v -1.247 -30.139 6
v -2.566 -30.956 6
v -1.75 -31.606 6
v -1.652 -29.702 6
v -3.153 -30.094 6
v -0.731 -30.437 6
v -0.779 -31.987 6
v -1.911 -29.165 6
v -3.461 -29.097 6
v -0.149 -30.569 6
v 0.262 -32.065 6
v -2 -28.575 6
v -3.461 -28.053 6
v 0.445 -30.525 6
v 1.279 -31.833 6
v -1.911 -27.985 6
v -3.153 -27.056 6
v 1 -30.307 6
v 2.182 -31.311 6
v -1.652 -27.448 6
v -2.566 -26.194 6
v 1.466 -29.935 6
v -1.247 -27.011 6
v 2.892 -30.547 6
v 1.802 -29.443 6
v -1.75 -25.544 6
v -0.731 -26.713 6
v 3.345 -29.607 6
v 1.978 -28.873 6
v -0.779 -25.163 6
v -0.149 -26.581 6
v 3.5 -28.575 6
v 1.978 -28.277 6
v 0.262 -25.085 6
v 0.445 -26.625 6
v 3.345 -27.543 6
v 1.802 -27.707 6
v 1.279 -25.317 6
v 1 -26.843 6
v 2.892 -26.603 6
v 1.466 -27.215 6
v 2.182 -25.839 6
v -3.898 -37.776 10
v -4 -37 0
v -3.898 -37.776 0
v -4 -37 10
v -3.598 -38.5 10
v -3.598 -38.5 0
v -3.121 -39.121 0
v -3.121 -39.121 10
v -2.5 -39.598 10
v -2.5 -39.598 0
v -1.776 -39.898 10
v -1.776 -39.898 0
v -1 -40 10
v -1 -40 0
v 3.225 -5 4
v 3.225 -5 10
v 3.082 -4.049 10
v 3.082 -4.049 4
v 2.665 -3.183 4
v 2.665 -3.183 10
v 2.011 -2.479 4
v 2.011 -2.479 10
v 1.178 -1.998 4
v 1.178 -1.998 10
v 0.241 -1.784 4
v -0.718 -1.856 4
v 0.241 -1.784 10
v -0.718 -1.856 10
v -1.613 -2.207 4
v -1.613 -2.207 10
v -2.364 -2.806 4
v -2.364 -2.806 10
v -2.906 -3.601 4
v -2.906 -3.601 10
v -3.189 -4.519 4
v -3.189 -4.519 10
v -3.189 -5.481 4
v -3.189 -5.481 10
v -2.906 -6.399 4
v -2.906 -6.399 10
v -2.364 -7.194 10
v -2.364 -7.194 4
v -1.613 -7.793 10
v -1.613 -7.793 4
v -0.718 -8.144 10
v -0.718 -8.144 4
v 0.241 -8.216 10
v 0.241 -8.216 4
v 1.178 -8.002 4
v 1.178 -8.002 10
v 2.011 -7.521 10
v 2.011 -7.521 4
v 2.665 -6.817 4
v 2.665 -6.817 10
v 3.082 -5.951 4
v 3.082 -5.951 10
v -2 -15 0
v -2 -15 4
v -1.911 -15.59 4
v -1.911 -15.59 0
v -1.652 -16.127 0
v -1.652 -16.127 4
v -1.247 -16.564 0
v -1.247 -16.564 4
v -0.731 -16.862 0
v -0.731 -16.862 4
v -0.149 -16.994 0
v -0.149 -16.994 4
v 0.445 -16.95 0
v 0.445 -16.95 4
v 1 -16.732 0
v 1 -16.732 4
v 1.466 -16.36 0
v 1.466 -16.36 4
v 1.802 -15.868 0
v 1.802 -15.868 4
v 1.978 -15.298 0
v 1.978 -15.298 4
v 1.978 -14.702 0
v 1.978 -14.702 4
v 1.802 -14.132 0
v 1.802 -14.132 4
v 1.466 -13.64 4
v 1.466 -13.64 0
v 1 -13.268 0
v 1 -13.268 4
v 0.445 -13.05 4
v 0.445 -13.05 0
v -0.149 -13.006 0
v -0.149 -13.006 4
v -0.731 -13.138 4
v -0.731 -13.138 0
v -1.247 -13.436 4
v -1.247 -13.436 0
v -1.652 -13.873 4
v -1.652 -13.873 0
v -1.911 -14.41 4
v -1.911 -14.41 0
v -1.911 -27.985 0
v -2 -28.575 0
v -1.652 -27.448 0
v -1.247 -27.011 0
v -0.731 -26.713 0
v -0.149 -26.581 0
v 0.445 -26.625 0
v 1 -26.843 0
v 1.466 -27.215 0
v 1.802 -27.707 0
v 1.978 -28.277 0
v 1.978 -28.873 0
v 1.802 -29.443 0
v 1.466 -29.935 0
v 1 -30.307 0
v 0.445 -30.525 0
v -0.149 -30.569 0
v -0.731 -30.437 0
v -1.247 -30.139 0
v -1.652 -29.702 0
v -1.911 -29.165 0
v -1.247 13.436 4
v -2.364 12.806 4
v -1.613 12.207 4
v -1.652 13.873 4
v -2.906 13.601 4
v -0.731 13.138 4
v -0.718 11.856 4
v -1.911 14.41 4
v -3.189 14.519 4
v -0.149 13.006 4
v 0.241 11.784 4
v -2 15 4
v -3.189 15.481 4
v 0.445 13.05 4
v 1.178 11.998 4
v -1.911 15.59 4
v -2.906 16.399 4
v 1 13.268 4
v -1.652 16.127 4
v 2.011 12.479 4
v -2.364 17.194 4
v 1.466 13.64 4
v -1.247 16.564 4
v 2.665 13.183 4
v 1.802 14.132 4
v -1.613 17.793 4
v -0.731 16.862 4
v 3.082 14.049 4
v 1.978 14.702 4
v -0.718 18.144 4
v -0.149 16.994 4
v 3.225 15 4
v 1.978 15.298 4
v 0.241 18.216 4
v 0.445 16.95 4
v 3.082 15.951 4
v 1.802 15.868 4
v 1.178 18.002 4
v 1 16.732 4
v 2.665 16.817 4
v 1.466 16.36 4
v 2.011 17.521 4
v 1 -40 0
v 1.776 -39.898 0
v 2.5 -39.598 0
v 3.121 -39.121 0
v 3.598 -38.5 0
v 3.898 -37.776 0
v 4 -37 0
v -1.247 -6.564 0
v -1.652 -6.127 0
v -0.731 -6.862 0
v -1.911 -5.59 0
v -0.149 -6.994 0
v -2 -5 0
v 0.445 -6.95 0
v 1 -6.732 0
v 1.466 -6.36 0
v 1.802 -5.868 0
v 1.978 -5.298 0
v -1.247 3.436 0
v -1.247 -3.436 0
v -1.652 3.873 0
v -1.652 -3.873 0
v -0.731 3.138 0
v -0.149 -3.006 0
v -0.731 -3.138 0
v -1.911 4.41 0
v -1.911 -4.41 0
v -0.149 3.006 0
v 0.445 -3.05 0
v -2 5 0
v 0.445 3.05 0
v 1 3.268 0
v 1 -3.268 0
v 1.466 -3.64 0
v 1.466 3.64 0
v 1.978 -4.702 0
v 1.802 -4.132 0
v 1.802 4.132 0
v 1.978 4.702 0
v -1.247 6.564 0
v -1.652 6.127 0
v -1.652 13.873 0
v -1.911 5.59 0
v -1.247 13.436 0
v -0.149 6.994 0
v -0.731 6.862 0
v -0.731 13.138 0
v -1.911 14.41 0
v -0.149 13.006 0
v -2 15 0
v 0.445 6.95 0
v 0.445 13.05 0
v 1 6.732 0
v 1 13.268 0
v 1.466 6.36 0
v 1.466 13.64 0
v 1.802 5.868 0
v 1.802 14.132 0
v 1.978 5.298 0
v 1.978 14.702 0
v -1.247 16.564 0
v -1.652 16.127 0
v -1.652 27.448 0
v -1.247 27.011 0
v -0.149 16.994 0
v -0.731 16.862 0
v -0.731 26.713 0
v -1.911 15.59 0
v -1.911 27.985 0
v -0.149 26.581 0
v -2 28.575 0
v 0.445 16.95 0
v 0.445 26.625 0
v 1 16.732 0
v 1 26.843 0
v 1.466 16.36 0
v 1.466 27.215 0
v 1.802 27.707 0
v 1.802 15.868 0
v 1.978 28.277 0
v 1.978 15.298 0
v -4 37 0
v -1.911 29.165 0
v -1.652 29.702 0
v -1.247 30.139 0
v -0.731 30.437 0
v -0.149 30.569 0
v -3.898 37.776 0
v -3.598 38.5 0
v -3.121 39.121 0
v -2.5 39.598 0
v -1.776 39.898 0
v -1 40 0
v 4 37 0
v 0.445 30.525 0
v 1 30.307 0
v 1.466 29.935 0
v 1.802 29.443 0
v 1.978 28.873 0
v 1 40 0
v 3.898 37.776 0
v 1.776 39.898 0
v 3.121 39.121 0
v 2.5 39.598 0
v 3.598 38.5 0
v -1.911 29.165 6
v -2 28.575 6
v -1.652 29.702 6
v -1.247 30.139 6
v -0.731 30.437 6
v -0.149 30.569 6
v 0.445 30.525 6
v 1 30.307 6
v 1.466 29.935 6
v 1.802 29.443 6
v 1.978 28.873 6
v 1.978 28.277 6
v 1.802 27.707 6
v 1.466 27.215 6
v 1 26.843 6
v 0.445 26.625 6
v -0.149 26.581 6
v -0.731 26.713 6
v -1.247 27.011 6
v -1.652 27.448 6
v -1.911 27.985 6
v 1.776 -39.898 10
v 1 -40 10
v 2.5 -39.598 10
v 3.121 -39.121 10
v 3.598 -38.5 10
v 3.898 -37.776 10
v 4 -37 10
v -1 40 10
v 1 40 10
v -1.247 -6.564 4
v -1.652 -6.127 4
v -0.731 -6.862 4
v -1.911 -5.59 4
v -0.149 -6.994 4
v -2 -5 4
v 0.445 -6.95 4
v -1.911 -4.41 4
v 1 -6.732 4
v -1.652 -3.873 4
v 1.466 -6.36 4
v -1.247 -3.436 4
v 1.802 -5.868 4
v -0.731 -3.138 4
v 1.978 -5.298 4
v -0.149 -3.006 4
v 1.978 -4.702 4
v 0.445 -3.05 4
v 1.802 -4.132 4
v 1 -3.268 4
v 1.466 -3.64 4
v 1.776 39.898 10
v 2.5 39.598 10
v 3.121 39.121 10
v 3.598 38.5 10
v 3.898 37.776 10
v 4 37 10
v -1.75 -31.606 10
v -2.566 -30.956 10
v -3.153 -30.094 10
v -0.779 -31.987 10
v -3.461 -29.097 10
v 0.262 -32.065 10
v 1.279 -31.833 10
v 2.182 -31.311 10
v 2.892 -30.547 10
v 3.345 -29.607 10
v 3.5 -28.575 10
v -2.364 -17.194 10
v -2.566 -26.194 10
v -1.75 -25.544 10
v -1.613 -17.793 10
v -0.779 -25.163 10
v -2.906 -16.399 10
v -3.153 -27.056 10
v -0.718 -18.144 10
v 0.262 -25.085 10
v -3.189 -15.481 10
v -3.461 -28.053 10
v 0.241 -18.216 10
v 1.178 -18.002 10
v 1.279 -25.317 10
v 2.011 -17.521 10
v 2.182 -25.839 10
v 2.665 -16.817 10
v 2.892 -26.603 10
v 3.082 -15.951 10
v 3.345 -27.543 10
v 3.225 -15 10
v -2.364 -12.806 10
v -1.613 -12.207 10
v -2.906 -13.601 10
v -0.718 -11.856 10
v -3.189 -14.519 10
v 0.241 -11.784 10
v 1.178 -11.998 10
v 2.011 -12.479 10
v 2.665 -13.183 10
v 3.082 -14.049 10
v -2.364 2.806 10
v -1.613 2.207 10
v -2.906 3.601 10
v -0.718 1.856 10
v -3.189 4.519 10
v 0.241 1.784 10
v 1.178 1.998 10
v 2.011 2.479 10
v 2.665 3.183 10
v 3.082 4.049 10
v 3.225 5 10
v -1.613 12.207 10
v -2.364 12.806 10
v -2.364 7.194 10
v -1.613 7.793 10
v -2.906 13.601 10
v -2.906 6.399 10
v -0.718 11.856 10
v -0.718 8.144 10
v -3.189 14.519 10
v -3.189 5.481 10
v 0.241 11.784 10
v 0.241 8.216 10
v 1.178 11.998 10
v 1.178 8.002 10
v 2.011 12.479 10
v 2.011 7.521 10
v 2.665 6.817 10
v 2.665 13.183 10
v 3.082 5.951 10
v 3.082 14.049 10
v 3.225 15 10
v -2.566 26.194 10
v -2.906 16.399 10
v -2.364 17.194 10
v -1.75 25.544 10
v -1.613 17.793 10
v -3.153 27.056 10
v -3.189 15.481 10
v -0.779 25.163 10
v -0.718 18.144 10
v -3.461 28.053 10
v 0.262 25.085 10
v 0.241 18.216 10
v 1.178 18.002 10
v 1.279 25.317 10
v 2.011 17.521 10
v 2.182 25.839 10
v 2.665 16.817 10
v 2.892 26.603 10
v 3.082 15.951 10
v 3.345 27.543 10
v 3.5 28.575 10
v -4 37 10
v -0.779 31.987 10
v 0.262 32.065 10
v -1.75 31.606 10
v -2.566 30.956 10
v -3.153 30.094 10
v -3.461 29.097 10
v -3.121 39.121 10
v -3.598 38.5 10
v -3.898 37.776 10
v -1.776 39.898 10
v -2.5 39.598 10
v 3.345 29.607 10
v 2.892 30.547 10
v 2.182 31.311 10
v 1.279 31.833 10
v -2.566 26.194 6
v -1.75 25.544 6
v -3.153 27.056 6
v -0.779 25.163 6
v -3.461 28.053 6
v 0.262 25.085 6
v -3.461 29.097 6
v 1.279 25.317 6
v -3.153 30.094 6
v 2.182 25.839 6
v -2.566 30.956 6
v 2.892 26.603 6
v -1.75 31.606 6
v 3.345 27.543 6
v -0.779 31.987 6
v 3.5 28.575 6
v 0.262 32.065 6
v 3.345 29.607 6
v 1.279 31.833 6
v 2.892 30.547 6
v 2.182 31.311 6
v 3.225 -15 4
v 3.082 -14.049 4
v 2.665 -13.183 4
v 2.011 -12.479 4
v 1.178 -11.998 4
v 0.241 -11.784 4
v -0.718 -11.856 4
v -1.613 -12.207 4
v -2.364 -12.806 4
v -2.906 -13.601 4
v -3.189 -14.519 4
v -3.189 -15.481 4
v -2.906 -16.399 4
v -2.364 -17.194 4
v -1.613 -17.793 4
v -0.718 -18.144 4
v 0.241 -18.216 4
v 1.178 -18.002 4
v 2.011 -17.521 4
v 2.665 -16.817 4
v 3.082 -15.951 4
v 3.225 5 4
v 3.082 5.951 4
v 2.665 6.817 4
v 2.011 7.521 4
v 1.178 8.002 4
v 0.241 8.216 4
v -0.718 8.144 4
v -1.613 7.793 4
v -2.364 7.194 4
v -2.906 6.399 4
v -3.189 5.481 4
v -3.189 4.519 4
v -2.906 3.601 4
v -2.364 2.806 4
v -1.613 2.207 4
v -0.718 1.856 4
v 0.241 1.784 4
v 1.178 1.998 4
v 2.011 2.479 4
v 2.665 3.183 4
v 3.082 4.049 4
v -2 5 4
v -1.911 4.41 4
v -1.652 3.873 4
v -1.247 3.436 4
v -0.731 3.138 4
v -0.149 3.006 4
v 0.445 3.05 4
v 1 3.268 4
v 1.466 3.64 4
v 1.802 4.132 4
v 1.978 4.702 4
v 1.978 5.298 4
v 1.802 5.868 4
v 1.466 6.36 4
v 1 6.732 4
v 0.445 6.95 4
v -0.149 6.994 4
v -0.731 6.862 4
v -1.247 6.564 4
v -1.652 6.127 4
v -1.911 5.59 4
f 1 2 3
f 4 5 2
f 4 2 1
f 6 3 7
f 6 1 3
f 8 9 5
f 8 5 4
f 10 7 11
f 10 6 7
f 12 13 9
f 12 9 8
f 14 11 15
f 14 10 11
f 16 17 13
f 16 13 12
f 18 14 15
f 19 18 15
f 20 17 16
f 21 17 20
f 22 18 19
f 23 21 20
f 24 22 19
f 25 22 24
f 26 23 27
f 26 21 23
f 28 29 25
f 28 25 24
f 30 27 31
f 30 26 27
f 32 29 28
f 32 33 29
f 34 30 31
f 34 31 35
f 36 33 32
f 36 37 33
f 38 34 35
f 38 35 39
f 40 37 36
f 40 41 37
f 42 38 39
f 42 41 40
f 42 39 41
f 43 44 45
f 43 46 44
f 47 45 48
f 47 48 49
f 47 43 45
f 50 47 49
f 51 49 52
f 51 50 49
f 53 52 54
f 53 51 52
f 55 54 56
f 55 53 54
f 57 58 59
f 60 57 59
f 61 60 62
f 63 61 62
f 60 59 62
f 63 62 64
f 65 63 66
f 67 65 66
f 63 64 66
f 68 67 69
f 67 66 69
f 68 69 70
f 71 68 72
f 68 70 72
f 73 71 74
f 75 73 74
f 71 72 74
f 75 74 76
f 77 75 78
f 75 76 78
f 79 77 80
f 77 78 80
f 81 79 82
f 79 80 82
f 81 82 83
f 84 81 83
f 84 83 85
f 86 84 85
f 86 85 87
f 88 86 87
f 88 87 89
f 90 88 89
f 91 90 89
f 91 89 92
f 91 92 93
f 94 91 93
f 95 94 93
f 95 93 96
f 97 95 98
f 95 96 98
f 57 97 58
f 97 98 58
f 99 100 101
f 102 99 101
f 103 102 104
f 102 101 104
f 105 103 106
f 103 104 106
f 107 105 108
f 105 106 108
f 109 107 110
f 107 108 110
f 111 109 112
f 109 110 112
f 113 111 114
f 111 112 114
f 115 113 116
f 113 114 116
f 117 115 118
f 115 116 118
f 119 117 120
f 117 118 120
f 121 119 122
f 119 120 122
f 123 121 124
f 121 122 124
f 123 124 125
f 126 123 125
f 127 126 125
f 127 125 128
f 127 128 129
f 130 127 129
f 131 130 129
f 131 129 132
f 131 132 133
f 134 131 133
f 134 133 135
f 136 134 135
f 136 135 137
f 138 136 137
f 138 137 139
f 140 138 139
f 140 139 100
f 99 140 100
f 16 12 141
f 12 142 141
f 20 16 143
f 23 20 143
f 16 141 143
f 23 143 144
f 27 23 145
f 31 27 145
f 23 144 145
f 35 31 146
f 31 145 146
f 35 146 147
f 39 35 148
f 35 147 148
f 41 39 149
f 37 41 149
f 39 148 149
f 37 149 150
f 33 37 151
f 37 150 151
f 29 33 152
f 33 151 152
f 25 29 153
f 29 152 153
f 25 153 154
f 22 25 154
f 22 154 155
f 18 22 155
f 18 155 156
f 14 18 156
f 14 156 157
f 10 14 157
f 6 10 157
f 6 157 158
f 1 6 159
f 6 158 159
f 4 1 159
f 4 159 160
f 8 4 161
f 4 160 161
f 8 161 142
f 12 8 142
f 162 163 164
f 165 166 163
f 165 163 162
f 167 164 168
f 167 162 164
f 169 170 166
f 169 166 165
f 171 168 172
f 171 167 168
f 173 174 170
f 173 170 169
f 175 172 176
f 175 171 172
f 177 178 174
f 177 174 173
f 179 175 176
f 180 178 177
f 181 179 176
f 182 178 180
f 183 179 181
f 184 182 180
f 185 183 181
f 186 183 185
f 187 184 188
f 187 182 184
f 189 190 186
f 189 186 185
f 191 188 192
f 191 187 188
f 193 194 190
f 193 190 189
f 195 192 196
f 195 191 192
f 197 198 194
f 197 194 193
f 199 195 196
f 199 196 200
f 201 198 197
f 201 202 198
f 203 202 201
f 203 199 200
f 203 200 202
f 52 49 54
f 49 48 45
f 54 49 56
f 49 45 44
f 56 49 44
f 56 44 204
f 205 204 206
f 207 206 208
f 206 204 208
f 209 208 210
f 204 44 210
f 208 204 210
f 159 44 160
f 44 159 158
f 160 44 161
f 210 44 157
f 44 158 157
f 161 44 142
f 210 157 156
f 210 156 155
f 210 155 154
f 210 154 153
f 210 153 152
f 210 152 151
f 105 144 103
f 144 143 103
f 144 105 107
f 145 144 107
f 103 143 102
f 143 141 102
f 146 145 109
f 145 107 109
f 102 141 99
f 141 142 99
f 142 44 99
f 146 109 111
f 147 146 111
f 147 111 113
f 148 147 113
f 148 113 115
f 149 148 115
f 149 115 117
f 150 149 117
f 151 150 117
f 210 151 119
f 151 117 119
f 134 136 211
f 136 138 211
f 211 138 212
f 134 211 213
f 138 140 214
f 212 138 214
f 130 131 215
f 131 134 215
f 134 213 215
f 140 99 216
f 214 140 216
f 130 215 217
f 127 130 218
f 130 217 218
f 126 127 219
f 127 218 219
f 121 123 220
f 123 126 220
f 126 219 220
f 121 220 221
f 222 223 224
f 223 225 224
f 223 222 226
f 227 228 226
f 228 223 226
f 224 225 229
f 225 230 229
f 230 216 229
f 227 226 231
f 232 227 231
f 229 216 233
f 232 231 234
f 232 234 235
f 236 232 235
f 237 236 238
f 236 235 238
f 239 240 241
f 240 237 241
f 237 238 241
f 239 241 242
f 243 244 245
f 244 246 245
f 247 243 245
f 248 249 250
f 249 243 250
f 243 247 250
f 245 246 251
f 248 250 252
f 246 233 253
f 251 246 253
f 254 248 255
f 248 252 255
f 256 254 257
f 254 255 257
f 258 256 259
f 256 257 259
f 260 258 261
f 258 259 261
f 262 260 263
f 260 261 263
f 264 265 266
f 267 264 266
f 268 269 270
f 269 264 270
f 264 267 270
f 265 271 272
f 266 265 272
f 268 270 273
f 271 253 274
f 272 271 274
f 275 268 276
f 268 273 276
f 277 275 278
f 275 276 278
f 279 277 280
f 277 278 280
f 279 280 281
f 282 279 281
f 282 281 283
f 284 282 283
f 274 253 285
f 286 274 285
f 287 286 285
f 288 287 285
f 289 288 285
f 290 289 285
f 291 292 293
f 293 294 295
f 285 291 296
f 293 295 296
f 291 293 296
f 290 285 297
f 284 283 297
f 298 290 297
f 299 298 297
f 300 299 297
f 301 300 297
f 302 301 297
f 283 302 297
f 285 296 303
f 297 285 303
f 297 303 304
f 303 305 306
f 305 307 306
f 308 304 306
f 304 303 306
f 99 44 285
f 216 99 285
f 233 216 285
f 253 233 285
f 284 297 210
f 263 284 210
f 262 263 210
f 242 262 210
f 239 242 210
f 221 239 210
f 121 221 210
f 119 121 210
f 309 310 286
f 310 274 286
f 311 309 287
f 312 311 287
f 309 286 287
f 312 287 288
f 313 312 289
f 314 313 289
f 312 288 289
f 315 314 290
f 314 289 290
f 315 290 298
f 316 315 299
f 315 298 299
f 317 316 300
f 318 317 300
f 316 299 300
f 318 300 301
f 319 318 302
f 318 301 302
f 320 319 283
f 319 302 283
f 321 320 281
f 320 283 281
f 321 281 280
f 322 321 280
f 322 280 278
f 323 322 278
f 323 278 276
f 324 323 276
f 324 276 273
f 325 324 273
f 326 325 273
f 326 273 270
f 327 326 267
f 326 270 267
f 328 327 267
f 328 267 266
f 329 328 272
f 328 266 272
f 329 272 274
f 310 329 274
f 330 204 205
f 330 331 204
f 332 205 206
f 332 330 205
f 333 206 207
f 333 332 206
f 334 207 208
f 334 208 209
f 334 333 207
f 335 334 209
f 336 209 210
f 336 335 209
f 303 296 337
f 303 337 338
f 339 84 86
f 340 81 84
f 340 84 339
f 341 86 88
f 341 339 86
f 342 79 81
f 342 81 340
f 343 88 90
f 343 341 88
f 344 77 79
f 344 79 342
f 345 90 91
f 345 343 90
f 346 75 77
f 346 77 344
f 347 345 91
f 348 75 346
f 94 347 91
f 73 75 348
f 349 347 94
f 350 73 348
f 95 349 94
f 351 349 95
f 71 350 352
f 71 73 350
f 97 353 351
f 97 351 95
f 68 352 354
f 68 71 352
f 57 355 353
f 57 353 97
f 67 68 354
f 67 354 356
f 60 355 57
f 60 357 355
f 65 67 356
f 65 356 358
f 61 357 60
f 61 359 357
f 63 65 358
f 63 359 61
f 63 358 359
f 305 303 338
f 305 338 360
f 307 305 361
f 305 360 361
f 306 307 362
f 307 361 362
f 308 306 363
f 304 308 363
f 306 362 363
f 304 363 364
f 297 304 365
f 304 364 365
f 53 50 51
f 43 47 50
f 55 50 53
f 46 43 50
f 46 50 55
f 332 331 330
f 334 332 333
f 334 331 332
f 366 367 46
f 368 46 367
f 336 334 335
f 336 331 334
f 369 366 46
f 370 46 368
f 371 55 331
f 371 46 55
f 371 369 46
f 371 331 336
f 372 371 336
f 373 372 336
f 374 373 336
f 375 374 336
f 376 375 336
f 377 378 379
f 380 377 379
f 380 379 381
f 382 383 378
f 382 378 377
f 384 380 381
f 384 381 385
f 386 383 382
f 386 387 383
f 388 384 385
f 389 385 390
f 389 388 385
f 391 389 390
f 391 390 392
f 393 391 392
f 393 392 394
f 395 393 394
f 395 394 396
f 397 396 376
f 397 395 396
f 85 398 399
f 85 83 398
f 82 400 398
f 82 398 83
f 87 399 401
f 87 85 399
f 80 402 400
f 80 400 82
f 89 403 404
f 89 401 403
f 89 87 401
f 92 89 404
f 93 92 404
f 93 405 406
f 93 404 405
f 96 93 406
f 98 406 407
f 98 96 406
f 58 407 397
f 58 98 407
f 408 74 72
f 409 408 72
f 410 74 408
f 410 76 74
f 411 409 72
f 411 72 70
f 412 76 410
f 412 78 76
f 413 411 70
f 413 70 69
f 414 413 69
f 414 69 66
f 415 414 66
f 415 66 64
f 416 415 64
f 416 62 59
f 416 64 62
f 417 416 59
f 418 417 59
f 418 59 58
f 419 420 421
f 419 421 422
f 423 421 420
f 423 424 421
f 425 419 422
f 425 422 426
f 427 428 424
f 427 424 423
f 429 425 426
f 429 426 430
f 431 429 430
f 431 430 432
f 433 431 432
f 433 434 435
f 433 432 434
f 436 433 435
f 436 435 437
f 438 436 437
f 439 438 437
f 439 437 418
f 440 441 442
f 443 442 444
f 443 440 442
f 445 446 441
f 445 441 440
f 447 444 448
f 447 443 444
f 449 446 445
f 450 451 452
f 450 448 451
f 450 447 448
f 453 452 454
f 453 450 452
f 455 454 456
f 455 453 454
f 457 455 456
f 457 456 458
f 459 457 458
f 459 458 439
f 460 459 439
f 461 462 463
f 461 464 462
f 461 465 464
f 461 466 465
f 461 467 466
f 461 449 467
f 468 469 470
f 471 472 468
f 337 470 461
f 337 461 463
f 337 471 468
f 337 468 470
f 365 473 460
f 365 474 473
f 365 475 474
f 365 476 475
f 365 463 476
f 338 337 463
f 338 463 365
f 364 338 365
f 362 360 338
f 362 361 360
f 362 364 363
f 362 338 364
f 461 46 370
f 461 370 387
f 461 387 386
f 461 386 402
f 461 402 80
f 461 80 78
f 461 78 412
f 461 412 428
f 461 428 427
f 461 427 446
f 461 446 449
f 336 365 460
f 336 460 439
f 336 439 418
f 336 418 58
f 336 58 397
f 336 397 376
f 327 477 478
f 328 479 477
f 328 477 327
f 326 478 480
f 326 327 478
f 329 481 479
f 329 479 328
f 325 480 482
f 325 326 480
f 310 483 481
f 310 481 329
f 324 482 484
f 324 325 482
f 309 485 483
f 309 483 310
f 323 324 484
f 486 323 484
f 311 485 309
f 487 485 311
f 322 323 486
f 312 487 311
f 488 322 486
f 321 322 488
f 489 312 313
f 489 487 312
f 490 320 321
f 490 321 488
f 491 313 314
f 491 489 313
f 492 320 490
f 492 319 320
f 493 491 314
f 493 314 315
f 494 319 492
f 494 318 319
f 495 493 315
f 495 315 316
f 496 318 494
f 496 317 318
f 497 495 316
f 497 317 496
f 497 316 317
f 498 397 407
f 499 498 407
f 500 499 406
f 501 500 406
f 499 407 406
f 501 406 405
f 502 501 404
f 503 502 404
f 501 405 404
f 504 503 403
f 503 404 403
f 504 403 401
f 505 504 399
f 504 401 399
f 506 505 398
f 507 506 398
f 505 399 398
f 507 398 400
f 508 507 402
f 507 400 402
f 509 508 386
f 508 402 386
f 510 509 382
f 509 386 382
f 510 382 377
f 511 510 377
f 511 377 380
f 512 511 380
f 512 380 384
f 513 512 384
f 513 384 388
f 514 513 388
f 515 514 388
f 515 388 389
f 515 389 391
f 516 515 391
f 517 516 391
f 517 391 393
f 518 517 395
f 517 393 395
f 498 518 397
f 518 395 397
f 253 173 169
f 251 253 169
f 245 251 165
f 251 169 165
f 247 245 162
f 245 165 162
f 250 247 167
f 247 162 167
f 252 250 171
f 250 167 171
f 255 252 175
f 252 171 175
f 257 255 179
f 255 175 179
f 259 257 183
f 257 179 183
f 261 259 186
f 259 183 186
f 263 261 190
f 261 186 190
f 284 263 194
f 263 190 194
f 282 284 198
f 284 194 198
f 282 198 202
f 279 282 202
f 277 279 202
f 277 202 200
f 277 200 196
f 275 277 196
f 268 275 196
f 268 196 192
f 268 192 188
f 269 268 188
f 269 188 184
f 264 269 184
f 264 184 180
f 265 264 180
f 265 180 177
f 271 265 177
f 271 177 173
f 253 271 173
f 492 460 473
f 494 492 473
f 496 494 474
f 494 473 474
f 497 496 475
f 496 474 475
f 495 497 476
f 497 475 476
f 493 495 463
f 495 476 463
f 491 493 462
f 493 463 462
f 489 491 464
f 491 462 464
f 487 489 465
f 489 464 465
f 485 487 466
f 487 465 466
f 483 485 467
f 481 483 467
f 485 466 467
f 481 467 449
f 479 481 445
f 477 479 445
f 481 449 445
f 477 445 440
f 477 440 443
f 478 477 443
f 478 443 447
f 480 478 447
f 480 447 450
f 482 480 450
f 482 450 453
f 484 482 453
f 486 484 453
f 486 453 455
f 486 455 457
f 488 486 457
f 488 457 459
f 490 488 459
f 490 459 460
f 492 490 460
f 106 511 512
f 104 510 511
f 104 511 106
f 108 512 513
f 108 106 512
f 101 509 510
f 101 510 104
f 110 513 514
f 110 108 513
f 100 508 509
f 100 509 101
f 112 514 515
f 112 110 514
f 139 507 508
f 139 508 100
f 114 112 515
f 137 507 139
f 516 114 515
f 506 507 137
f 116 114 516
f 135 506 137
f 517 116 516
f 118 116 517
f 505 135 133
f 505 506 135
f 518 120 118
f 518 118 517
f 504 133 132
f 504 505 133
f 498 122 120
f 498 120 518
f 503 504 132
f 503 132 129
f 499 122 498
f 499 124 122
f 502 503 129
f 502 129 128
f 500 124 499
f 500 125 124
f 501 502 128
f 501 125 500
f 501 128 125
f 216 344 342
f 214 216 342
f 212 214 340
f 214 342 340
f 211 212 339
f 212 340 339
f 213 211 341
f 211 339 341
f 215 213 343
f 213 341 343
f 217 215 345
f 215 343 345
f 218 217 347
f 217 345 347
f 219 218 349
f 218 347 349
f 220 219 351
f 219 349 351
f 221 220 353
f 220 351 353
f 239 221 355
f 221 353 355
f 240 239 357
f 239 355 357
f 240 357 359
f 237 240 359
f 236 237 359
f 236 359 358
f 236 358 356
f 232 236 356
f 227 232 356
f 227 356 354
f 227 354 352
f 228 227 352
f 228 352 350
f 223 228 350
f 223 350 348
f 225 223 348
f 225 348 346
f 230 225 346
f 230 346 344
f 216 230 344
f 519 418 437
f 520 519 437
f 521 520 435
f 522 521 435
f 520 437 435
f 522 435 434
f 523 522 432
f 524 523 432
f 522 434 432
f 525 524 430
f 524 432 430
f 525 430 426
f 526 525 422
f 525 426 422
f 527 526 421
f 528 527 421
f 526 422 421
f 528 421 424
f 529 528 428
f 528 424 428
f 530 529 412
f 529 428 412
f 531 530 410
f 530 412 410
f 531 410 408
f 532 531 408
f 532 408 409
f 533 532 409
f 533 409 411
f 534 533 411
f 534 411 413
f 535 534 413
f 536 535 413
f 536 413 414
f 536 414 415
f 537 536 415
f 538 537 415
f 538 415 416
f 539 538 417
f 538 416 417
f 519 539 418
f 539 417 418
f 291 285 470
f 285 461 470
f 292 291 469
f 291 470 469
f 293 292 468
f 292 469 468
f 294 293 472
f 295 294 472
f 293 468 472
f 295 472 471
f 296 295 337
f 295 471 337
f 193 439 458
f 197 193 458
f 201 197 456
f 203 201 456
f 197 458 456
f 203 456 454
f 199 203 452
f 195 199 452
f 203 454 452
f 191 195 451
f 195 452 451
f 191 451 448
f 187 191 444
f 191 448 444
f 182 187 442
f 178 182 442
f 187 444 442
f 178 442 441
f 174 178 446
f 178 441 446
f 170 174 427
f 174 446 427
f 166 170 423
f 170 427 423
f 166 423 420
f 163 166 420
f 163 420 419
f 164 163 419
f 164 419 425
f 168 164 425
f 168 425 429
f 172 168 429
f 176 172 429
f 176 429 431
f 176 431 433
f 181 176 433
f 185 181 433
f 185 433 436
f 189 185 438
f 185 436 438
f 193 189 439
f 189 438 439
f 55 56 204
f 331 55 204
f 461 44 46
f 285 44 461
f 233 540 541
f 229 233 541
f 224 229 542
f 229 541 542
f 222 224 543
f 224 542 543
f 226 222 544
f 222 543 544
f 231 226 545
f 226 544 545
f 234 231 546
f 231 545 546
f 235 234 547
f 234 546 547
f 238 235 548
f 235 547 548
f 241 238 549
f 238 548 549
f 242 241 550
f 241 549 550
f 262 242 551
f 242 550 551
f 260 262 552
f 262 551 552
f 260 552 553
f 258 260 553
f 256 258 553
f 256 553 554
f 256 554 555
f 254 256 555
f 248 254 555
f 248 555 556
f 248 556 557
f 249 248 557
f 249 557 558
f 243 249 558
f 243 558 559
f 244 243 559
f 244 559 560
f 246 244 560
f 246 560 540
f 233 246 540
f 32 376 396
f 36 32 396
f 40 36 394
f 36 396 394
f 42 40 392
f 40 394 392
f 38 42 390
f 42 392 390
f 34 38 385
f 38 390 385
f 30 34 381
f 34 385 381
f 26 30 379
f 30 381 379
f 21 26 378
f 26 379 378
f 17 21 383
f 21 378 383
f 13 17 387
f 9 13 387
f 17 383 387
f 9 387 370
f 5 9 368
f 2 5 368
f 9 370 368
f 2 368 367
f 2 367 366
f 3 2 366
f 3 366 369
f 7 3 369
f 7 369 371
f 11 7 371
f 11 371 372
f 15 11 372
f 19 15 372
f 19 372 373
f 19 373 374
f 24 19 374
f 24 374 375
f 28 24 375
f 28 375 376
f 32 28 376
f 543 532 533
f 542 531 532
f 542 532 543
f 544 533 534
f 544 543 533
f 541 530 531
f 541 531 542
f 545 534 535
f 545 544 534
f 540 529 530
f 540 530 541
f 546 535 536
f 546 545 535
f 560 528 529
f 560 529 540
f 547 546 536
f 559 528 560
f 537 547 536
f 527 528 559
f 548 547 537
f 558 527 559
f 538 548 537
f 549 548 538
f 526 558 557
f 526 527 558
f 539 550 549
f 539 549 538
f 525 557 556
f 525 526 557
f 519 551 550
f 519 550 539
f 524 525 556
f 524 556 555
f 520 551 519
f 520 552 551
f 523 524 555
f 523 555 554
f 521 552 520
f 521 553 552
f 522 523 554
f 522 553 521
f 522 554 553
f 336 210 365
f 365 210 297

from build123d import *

# Parameters (mm, degrees)
F0_W           = 8
F0_H           = 80
F0_R           = 3.225
F1_DEPTH       = 10
F3_D           = 4
F3_CBORE_D     = 7
F3_CBORE_DEPTH = 4
F4_R           = 3
F2_R           = 3.225
F5_DEPTH       = 6
F6_D           = 4


with BuildPart() as f1:
    # F0 (on Top) → F1 (new body)
    with BuildSketch(Plane.XY):
        Rectangle(F0_W, F0_H)
        with Locations((0, -15)):
            Circle(F0_R, mode=Mode.SUBTRACT)
        with Locations((0, -5)):
            Circle(F0_R, mode=Mode.SUBTRACT)
        with Locations((0, 5)):
            Circle(F0_R, mode=Mode.SUBTRACT)
        with Locations((0, 15)):
            Circle(F0_R, mode=Mode.SUBTRACT)
        with Locations((0, 5)):
            Circle(F0_R)
        with Locations((0, -5)):
            Circle(F0_R)
        with Locations((0, 15)):
            Circle(F0_R)
        with Locations((0, -15)):
            Circle(F0_R)
    extrude(amount=F1_DEPTH)

    # F3 (through all)
    with Locations(Plane.XY.offset(10)):
        with Locations((0, 28.575), (0, -28.575)):
            CounterBoreHole(F3_D / 2, F3_CBORE_D / 2, F3_CBORE_DEPTH)

    # F4
    f4_edges = [f1.edges().sort_by_distance(p)[0] for p in [
        (-4, 40, 5),
        (4, 40, 5),
        (-4, -40, 5),
        (4, -40, 5),
    ]]
    fillet(f4_edges, radius=F4_R)

    # F2 (on face) → F5 (cut)
    with BuildSketch(Plane.XY.offset(10)):
        with Locations((0, -5)):
            Circle(F2_R)
        with Locations((0, 5)):
            Circle(F2_R)
        with Locations((0, 15)):
            Circle(F2_R)
        with Locations((0, -15)):
            Circle(F2_R)
    extrude(amount=-F5_DEPTH, mode=Mode.SUBTRACT)

    # F6 (through all)
    with Locations(Plane(origin=(0, 0, 0), x_dir=(1, 0, 0), z_dir=(0, 0, -1))):
        with Locations((0, 15), (0, 5), (0, -5), (0, -15)):
            Hole(F6_D / 2)


solid = f1.part
